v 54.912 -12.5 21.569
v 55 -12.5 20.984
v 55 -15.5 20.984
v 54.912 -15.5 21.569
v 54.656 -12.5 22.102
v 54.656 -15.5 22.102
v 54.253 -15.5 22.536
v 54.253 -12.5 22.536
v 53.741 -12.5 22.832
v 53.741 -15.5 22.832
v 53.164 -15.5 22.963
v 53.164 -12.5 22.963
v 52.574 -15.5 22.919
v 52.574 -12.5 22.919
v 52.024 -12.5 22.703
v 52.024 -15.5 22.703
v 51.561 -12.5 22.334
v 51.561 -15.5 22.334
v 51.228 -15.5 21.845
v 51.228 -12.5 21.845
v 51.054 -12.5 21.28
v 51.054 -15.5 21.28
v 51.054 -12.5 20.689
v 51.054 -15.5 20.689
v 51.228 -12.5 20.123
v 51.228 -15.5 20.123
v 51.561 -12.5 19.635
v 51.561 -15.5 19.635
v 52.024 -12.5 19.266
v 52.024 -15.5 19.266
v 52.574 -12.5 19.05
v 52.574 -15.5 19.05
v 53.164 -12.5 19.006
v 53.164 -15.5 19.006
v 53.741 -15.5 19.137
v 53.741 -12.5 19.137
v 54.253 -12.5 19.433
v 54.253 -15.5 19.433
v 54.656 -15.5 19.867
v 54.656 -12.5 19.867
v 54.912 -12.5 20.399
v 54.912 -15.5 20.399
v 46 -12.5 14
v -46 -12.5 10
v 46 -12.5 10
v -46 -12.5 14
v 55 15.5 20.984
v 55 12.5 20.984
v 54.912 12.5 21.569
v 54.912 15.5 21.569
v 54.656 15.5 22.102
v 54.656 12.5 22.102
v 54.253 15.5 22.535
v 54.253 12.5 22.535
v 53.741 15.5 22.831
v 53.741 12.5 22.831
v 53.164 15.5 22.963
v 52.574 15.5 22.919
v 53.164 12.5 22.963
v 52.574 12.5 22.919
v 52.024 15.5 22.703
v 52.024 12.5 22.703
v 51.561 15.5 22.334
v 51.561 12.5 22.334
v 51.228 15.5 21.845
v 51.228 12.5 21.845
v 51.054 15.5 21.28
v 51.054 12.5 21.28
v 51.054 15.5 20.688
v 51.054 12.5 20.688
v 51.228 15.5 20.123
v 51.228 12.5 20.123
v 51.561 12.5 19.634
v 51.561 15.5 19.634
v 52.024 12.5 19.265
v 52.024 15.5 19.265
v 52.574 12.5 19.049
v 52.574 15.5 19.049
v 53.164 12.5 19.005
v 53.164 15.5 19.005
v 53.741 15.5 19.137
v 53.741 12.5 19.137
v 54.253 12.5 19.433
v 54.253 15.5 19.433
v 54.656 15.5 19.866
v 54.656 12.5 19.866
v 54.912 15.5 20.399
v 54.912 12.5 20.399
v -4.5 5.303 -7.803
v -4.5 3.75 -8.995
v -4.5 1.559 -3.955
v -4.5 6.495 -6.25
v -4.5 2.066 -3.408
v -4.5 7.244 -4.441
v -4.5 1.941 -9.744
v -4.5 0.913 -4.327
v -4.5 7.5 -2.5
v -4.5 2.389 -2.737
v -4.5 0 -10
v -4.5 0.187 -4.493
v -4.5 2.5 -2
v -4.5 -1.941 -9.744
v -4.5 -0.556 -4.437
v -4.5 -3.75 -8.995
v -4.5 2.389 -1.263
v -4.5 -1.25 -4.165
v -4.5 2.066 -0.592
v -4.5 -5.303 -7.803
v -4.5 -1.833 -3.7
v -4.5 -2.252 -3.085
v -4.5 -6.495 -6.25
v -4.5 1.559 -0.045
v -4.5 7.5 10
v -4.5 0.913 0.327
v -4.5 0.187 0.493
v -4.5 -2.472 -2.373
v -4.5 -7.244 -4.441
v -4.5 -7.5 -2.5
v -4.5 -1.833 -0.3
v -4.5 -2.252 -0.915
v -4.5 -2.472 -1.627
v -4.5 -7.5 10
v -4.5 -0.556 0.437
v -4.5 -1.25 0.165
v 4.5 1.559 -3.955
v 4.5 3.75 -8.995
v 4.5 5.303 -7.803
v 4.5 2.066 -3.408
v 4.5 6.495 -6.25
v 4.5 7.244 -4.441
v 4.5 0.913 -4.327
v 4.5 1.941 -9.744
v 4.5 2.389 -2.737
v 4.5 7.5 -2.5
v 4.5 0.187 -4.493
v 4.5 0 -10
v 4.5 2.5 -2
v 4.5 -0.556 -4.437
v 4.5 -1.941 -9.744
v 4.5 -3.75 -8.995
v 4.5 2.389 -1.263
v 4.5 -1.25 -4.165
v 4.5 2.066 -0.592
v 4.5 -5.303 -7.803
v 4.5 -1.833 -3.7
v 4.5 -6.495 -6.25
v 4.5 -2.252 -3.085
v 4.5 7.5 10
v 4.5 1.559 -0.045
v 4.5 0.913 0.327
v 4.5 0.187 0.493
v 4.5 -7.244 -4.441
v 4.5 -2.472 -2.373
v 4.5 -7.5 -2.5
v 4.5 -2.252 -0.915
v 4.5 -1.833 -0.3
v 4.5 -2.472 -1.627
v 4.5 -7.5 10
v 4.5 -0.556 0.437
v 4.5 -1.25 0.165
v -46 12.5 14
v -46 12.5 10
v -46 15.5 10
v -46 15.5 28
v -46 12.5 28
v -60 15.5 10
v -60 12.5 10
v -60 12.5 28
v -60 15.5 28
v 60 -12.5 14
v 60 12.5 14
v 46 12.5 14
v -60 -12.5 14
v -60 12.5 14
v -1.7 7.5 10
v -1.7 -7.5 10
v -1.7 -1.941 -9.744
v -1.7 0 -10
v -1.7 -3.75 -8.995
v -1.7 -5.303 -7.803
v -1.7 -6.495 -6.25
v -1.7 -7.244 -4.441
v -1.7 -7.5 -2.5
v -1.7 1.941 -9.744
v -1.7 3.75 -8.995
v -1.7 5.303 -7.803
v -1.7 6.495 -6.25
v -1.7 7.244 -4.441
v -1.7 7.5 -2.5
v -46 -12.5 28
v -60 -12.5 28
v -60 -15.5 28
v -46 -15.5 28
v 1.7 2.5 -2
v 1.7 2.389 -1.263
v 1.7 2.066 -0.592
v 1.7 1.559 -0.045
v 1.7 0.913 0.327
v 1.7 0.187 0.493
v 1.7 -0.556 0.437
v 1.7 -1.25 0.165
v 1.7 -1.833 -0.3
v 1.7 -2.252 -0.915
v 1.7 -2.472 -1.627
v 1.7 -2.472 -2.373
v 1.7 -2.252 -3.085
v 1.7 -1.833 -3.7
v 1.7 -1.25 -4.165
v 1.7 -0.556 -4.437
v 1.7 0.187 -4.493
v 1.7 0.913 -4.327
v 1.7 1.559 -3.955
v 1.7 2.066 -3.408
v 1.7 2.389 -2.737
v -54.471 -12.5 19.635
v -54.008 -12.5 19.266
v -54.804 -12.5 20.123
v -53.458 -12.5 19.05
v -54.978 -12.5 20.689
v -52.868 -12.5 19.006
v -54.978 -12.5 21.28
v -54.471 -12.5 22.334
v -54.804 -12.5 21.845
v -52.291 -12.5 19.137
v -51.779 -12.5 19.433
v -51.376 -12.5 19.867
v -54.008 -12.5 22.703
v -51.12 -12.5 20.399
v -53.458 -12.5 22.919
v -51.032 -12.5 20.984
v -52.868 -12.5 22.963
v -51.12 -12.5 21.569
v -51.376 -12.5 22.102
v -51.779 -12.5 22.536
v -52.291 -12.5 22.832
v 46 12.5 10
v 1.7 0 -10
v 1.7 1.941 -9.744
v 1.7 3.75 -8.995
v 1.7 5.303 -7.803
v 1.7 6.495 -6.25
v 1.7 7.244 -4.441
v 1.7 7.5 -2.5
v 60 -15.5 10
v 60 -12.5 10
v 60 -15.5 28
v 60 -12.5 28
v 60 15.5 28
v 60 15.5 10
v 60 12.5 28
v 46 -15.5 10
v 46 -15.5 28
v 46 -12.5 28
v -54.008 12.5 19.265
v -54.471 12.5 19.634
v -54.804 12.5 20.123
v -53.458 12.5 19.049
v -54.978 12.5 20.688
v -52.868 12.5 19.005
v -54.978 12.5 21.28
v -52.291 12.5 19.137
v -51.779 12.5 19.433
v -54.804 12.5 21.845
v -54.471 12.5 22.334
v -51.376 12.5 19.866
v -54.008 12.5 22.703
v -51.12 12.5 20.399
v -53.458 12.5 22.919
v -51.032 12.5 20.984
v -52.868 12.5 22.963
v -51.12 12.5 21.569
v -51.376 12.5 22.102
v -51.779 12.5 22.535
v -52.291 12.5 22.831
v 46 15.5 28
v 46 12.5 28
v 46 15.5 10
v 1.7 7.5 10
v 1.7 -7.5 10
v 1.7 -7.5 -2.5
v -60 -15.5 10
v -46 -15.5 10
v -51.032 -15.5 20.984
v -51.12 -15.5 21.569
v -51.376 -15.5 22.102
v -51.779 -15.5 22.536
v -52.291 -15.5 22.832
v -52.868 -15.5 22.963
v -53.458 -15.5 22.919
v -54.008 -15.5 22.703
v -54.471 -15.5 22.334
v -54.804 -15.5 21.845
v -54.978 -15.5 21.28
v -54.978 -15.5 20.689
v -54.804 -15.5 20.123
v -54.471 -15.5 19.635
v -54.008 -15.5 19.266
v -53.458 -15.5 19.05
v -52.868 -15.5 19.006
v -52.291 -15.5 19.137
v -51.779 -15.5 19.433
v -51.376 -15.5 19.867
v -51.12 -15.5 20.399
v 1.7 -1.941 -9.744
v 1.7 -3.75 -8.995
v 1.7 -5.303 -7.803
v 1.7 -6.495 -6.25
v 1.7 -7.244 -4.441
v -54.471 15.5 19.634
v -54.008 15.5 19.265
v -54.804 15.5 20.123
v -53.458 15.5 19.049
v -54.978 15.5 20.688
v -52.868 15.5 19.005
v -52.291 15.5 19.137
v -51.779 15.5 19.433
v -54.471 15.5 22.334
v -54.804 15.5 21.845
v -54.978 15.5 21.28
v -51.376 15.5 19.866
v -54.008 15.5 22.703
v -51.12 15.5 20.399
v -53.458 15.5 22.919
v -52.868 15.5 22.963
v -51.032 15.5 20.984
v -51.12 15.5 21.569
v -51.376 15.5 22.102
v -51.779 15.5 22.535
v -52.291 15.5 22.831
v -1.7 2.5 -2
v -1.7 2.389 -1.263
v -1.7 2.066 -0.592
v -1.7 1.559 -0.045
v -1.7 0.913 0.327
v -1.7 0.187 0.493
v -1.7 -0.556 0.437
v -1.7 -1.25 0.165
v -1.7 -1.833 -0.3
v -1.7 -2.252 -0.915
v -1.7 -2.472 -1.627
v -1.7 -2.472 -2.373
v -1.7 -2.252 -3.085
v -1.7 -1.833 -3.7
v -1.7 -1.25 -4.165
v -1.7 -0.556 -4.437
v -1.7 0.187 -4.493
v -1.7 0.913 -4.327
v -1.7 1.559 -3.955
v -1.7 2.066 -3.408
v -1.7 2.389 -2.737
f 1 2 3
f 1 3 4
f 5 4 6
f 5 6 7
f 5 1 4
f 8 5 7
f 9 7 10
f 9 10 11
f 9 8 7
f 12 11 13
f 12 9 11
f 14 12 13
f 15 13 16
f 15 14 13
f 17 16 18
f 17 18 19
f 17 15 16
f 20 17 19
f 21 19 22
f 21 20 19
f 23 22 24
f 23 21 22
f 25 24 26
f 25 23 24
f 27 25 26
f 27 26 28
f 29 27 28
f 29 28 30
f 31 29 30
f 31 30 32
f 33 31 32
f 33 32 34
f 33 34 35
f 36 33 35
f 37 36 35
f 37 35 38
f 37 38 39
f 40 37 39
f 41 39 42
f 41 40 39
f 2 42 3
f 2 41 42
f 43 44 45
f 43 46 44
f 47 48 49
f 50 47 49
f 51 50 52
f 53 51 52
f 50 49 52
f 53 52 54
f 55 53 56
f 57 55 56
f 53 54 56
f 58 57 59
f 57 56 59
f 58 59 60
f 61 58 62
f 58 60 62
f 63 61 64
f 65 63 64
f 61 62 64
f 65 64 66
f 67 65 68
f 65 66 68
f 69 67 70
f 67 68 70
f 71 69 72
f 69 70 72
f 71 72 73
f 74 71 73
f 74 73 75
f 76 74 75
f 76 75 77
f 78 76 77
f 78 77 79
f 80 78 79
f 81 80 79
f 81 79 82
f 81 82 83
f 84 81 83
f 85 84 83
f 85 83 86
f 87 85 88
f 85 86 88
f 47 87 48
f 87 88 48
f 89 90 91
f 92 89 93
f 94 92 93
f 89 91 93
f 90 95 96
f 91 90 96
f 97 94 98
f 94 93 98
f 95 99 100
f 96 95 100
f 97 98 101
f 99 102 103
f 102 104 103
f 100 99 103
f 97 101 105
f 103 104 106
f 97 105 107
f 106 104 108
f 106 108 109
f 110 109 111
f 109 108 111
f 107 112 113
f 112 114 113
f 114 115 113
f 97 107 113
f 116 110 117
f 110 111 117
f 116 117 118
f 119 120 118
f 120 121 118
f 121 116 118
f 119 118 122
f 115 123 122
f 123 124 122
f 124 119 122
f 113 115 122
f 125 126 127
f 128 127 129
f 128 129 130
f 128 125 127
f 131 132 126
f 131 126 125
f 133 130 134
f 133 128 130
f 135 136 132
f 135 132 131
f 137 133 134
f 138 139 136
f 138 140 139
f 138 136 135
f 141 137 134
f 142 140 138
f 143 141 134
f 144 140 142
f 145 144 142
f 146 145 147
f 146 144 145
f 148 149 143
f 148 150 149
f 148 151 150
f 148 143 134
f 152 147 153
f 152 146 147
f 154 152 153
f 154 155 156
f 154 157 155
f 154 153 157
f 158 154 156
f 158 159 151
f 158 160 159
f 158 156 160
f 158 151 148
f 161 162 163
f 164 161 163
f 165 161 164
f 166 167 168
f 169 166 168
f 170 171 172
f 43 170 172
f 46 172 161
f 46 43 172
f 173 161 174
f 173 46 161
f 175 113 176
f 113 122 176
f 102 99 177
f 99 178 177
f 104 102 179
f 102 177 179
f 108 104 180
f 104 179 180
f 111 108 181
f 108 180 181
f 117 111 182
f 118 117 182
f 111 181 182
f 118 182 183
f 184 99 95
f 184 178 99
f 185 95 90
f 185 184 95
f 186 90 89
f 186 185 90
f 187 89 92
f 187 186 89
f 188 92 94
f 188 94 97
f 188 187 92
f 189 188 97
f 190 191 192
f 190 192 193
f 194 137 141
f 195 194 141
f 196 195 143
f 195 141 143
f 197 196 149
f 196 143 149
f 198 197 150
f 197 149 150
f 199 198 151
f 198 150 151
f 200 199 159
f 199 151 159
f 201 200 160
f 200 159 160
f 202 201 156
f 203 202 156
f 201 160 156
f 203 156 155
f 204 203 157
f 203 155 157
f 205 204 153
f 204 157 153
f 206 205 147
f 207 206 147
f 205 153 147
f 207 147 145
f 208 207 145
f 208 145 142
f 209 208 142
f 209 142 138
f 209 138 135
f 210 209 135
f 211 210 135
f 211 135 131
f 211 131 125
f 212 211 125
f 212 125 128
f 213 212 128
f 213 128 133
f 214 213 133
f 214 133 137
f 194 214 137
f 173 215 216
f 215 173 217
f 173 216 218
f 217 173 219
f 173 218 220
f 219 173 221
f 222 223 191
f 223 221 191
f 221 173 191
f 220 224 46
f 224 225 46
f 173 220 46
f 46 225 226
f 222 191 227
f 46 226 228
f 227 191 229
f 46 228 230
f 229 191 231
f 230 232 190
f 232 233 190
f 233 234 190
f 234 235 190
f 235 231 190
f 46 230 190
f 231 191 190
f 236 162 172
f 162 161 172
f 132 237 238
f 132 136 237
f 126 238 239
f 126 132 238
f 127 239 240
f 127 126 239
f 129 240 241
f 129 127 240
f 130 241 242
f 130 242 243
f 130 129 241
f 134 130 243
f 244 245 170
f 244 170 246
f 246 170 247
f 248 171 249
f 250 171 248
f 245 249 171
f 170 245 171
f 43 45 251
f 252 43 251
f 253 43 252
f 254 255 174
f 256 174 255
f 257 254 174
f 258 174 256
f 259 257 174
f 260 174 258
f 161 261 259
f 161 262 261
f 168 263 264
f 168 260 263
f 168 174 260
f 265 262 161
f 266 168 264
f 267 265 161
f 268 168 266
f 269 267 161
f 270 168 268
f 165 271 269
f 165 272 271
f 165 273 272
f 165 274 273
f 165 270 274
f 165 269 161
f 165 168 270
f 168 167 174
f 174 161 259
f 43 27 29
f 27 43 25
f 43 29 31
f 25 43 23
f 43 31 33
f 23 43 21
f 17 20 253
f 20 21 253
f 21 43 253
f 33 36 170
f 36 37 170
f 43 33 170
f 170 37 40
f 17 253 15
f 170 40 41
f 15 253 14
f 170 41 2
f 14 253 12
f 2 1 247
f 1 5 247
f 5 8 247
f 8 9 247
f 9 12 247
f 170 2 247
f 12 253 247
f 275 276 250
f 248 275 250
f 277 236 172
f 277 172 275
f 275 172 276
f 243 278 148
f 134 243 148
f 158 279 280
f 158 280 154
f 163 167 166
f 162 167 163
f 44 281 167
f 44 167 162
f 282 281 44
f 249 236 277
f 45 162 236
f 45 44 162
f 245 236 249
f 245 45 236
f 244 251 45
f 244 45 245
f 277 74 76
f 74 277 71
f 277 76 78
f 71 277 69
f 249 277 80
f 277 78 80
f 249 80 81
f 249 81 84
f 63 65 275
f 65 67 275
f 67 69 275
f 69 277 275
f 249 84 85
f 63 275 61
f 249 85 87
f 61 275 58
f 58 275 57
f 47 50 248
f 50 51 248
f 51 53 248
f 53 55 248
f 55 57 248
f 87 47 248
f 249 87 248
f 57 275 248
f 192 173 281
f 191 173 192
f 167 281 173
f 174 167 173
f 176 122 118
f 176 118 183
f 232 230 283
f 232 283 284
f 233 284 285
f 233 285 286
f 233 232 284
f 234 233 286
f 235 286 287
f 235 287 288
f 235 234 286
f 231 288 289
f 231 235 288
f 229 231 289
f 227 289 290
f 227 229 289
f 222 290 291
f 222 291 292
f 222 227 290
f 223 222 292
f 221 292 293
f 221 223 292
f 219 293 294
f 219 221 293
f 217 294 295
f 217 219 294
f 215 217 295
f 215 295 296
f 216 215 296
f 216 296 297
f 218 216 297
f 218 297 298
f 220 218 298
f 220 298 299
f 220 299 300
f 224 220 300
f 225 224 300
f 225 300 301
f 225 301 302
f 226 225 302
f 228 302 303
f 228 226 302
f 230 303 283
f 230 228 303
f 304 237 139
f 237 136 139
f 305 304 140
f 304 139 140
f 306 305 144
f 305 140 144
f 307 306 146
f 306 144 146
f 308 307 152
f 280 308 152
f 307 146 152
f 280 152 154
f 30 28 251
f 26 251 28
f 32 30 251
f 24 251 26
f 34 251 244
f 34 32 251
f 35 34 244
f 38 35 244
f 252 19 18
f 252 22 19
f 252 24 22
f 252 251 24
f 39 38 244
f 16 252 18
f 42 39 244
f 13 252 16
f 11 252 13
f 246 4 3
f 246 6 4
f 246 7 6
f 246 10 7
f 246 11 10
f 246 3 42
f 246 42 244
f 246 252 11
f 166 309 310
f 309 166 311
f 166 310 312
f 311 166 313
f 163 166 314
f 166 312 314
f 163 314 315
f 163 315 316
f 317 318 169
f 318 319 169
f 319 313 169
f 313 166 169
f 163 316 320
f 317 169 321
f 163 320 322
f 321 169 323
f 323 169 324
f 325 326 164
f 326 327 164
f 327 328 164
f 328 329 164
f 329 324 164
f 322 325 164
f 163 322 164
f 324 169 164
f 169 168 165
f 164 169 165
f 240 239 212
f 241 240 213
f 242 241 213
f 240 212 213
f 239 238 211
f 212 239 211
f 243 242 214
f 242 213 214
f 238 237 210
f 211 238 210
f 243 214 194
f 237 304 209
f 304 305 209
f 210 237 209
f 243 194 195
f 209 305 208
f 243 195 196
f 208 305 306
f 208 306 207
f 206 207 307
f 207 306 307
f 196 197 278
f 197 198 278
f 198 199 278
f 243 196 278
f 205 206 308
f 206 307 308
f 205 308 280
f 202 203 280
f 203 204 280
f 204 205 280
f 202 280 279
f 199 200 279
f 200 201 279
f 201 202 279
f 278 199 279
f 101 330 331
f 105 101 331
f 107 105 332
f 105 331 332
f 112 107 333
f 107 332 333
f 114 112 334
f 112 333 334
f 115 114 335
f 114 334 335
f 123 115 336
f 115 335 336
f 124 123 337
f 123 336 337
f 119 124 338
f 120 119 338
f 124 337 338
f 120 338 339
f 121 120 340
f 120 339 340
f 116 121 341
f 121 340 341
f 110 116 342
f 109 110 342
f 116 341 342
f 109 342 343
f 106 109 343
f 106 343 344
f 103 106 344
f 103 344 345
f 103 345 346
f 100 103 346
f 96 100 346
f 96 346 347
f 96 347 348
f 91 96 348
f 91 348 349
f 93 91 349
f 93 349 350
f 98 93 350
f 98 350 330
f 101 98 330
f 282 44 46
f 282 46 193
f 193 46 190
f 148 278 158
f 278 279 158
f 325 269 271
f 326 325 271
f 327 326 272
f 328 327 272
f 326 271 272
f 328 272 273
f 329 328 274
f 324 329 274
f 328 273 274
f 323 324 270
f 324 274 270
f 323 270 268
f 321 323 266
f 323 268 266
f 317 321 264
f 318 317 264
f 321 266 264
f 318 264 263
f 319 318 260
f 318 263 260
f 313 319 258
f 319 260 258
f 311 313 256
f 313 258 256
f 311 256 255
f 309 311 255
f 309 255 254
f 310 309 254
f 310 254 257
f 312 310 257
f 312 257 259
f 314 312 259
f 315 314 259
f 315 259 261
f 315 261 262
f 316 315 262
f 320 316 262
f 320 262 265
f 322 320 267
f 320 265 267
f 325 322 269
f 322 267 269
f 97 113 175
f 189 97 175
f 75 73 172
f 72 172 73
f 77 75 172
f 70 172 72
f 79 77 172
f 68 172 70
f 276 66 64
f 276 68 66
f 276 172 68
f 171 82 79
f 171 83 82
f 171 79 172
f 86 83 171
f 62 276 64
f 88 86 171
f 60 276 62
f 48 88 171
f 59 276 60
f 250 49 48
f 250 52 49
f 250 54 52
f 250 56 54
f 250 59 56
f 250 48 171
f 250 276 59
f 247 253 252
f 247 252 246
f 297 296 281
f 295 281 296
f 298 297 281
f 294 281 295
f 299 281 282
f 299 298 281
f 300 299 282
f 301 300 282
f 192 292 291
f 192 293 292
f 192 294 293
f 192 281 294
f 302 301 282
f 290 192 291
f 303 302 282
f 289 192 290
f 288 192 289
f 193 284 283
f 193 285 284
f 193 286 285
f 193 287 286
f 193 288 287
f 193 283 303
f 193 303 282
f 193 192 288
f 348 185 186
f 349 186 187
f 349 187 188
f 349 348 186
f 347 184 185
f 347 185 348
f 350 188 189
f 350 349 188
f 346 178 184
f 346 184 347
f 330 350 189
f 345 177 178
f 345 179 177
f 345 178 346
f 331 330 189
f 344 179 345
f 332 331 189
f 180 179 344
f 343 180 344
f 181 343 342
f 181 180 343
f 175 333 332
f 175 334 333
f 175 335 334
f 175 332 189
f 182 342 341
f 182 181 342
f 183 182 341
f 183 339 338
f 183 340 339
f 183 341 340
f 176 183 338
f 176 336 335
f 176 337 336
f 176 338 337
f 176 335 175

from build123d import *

# Parameters (mm, degrees)
F0_W      = 2.8
F0_H      = 20
F1_DEPTH  = 7.5
F3_R      = 2.5
F4_DEPTH  = 9.001
F5_R      = 7.49999
F5_2_R    = 7.49999
F6_DEPTH  = 12.5
F8_W      = 14
F8_H      = 18
F8_R      = 1.984375
F9_DEPTH  = 3
F11_W     = 14
F11_H     = 18
F11_R     = 1.984375
F12_DEPTH = 3


# Not quite as in the source:
# - a fillet or chamfer is up to 0.001 mm smaller than in the source, because OpenCascade refuses the exact size


with BuildPart() as f1:
    # F0 (on Front) → F1 (new body, symmetric)
    with BuildSketch(Plane.XZ):
        with Locations((-3.1, 0)):
            Rectangle(F0_W, F0_H)
    extrude(amount=F1_DEPTH, both=True)


with BuildPart() as f1b:
    # F0 (on Front) → F1, piece 2 (new body, symmetric)
    with BuildSketch(Plane.XZ):
        with Locations((3.1, 0)):
            Rectangle(F0_W, F0_H)
    extrude(amount=F1_DEPTH, both=True)


with BuildPart() as f4_tool:
    # F3 (on offset) → F4 (new body, through all)
    with BuildSketch(Plane.YZ.offset(4.5)):
        with Locations((0, -2)):
            Circle(F3_R)
    extrude(amount=-F4_DEPTH)


with BuildPart() as f1_1:
    add(f1.part)

    # F4: cut by f4_tool
    add(f4_tool.part, mode=Mode.SUBTRACT)

    # F5#2 (radius 7.5 in the source; OpenCascade refuses exactly that, so slightly less here)
    f5_2_edges = [f1_1.edges().sort_by_distance(p)[0] for p in [
        (-3.1, -7.5, -10),
        (-3.1, 7.5, -10),
    ]]
    fillet(f5_2_edges, radius=F5_2_R)


with BuildPart() as f1b_1:
    add(f1b.part)

    # F4: cut by f4_tool
    add(f4_tool.part, mode=Mode.SUBTRACT)

    # F5 (radius 7.5 in the source; OpenCascade refuses exactly that, so slightly less here)
    f5_edges = [f1b_1.edges().sort_by_distance(p)[0] for p in [
        (3.1, -7.5, -10),
        (3.1, 7.5, -10),
    ]]
    fillet(f5_edges, radius=F5_R)


with BuildPart() as f6:
    # F0 (on Front) → F6 (new body, symmetric)
    with BuildSketch(Plane.XZ):
        Polygon((-1.7, 10), (1.7, 10), (4.5, 10), (60.0000013411, 10), (60.0000013411, 14), (-59.9999986589, 14), (-59.9999986589, 10), (-4.5, 10), align=None)
    extrude(amount=F6_DEPTH, both=True)

    # F8 (on offset) → F9 (join)
    with BuildSketch(Plane.XZ.offset(12.5)):
        with Locations((-52.9999986589, 19)):
            Rectangle(F8_W, F8_H)
        with Locations((-53.0159986589, 20.984375)):
            Circle(F8_R, mode=Mode.SUBTRACT)
        with Locations((52.9999986589, 19)):
            Rectangle(F8_W, F8_H)
        with Locations((53.0159986589, 20.984375)):
            Circle(F8_R, mode=Mode.SUBTRACT)
    extrude(amount=F9_DEPTH)

    # F11 (on offset) → F12 (join)
    with BuildSketch(Plane.XZ.offset(-12.5)):
        with Locations((53.0000013411, 19)):
            Rectangle(F11_W, F11_H)
        with Locations((53.0160013411, 20.984)):
            Circle(F11_R, mode=Mode.SUBTRACT)
        with Locations((-53.0000013411, 19)):
            Rectangle(F11_W, F11_H)
        with Locations((-53.0160013411, 20.984)):
            Circle(F11_R, mode=Mode.SUBTRACT)
    extrude(amount=-F12_DEPTH)


solid = Compound([f1_1.part, f1b_1.part, f6.part])
